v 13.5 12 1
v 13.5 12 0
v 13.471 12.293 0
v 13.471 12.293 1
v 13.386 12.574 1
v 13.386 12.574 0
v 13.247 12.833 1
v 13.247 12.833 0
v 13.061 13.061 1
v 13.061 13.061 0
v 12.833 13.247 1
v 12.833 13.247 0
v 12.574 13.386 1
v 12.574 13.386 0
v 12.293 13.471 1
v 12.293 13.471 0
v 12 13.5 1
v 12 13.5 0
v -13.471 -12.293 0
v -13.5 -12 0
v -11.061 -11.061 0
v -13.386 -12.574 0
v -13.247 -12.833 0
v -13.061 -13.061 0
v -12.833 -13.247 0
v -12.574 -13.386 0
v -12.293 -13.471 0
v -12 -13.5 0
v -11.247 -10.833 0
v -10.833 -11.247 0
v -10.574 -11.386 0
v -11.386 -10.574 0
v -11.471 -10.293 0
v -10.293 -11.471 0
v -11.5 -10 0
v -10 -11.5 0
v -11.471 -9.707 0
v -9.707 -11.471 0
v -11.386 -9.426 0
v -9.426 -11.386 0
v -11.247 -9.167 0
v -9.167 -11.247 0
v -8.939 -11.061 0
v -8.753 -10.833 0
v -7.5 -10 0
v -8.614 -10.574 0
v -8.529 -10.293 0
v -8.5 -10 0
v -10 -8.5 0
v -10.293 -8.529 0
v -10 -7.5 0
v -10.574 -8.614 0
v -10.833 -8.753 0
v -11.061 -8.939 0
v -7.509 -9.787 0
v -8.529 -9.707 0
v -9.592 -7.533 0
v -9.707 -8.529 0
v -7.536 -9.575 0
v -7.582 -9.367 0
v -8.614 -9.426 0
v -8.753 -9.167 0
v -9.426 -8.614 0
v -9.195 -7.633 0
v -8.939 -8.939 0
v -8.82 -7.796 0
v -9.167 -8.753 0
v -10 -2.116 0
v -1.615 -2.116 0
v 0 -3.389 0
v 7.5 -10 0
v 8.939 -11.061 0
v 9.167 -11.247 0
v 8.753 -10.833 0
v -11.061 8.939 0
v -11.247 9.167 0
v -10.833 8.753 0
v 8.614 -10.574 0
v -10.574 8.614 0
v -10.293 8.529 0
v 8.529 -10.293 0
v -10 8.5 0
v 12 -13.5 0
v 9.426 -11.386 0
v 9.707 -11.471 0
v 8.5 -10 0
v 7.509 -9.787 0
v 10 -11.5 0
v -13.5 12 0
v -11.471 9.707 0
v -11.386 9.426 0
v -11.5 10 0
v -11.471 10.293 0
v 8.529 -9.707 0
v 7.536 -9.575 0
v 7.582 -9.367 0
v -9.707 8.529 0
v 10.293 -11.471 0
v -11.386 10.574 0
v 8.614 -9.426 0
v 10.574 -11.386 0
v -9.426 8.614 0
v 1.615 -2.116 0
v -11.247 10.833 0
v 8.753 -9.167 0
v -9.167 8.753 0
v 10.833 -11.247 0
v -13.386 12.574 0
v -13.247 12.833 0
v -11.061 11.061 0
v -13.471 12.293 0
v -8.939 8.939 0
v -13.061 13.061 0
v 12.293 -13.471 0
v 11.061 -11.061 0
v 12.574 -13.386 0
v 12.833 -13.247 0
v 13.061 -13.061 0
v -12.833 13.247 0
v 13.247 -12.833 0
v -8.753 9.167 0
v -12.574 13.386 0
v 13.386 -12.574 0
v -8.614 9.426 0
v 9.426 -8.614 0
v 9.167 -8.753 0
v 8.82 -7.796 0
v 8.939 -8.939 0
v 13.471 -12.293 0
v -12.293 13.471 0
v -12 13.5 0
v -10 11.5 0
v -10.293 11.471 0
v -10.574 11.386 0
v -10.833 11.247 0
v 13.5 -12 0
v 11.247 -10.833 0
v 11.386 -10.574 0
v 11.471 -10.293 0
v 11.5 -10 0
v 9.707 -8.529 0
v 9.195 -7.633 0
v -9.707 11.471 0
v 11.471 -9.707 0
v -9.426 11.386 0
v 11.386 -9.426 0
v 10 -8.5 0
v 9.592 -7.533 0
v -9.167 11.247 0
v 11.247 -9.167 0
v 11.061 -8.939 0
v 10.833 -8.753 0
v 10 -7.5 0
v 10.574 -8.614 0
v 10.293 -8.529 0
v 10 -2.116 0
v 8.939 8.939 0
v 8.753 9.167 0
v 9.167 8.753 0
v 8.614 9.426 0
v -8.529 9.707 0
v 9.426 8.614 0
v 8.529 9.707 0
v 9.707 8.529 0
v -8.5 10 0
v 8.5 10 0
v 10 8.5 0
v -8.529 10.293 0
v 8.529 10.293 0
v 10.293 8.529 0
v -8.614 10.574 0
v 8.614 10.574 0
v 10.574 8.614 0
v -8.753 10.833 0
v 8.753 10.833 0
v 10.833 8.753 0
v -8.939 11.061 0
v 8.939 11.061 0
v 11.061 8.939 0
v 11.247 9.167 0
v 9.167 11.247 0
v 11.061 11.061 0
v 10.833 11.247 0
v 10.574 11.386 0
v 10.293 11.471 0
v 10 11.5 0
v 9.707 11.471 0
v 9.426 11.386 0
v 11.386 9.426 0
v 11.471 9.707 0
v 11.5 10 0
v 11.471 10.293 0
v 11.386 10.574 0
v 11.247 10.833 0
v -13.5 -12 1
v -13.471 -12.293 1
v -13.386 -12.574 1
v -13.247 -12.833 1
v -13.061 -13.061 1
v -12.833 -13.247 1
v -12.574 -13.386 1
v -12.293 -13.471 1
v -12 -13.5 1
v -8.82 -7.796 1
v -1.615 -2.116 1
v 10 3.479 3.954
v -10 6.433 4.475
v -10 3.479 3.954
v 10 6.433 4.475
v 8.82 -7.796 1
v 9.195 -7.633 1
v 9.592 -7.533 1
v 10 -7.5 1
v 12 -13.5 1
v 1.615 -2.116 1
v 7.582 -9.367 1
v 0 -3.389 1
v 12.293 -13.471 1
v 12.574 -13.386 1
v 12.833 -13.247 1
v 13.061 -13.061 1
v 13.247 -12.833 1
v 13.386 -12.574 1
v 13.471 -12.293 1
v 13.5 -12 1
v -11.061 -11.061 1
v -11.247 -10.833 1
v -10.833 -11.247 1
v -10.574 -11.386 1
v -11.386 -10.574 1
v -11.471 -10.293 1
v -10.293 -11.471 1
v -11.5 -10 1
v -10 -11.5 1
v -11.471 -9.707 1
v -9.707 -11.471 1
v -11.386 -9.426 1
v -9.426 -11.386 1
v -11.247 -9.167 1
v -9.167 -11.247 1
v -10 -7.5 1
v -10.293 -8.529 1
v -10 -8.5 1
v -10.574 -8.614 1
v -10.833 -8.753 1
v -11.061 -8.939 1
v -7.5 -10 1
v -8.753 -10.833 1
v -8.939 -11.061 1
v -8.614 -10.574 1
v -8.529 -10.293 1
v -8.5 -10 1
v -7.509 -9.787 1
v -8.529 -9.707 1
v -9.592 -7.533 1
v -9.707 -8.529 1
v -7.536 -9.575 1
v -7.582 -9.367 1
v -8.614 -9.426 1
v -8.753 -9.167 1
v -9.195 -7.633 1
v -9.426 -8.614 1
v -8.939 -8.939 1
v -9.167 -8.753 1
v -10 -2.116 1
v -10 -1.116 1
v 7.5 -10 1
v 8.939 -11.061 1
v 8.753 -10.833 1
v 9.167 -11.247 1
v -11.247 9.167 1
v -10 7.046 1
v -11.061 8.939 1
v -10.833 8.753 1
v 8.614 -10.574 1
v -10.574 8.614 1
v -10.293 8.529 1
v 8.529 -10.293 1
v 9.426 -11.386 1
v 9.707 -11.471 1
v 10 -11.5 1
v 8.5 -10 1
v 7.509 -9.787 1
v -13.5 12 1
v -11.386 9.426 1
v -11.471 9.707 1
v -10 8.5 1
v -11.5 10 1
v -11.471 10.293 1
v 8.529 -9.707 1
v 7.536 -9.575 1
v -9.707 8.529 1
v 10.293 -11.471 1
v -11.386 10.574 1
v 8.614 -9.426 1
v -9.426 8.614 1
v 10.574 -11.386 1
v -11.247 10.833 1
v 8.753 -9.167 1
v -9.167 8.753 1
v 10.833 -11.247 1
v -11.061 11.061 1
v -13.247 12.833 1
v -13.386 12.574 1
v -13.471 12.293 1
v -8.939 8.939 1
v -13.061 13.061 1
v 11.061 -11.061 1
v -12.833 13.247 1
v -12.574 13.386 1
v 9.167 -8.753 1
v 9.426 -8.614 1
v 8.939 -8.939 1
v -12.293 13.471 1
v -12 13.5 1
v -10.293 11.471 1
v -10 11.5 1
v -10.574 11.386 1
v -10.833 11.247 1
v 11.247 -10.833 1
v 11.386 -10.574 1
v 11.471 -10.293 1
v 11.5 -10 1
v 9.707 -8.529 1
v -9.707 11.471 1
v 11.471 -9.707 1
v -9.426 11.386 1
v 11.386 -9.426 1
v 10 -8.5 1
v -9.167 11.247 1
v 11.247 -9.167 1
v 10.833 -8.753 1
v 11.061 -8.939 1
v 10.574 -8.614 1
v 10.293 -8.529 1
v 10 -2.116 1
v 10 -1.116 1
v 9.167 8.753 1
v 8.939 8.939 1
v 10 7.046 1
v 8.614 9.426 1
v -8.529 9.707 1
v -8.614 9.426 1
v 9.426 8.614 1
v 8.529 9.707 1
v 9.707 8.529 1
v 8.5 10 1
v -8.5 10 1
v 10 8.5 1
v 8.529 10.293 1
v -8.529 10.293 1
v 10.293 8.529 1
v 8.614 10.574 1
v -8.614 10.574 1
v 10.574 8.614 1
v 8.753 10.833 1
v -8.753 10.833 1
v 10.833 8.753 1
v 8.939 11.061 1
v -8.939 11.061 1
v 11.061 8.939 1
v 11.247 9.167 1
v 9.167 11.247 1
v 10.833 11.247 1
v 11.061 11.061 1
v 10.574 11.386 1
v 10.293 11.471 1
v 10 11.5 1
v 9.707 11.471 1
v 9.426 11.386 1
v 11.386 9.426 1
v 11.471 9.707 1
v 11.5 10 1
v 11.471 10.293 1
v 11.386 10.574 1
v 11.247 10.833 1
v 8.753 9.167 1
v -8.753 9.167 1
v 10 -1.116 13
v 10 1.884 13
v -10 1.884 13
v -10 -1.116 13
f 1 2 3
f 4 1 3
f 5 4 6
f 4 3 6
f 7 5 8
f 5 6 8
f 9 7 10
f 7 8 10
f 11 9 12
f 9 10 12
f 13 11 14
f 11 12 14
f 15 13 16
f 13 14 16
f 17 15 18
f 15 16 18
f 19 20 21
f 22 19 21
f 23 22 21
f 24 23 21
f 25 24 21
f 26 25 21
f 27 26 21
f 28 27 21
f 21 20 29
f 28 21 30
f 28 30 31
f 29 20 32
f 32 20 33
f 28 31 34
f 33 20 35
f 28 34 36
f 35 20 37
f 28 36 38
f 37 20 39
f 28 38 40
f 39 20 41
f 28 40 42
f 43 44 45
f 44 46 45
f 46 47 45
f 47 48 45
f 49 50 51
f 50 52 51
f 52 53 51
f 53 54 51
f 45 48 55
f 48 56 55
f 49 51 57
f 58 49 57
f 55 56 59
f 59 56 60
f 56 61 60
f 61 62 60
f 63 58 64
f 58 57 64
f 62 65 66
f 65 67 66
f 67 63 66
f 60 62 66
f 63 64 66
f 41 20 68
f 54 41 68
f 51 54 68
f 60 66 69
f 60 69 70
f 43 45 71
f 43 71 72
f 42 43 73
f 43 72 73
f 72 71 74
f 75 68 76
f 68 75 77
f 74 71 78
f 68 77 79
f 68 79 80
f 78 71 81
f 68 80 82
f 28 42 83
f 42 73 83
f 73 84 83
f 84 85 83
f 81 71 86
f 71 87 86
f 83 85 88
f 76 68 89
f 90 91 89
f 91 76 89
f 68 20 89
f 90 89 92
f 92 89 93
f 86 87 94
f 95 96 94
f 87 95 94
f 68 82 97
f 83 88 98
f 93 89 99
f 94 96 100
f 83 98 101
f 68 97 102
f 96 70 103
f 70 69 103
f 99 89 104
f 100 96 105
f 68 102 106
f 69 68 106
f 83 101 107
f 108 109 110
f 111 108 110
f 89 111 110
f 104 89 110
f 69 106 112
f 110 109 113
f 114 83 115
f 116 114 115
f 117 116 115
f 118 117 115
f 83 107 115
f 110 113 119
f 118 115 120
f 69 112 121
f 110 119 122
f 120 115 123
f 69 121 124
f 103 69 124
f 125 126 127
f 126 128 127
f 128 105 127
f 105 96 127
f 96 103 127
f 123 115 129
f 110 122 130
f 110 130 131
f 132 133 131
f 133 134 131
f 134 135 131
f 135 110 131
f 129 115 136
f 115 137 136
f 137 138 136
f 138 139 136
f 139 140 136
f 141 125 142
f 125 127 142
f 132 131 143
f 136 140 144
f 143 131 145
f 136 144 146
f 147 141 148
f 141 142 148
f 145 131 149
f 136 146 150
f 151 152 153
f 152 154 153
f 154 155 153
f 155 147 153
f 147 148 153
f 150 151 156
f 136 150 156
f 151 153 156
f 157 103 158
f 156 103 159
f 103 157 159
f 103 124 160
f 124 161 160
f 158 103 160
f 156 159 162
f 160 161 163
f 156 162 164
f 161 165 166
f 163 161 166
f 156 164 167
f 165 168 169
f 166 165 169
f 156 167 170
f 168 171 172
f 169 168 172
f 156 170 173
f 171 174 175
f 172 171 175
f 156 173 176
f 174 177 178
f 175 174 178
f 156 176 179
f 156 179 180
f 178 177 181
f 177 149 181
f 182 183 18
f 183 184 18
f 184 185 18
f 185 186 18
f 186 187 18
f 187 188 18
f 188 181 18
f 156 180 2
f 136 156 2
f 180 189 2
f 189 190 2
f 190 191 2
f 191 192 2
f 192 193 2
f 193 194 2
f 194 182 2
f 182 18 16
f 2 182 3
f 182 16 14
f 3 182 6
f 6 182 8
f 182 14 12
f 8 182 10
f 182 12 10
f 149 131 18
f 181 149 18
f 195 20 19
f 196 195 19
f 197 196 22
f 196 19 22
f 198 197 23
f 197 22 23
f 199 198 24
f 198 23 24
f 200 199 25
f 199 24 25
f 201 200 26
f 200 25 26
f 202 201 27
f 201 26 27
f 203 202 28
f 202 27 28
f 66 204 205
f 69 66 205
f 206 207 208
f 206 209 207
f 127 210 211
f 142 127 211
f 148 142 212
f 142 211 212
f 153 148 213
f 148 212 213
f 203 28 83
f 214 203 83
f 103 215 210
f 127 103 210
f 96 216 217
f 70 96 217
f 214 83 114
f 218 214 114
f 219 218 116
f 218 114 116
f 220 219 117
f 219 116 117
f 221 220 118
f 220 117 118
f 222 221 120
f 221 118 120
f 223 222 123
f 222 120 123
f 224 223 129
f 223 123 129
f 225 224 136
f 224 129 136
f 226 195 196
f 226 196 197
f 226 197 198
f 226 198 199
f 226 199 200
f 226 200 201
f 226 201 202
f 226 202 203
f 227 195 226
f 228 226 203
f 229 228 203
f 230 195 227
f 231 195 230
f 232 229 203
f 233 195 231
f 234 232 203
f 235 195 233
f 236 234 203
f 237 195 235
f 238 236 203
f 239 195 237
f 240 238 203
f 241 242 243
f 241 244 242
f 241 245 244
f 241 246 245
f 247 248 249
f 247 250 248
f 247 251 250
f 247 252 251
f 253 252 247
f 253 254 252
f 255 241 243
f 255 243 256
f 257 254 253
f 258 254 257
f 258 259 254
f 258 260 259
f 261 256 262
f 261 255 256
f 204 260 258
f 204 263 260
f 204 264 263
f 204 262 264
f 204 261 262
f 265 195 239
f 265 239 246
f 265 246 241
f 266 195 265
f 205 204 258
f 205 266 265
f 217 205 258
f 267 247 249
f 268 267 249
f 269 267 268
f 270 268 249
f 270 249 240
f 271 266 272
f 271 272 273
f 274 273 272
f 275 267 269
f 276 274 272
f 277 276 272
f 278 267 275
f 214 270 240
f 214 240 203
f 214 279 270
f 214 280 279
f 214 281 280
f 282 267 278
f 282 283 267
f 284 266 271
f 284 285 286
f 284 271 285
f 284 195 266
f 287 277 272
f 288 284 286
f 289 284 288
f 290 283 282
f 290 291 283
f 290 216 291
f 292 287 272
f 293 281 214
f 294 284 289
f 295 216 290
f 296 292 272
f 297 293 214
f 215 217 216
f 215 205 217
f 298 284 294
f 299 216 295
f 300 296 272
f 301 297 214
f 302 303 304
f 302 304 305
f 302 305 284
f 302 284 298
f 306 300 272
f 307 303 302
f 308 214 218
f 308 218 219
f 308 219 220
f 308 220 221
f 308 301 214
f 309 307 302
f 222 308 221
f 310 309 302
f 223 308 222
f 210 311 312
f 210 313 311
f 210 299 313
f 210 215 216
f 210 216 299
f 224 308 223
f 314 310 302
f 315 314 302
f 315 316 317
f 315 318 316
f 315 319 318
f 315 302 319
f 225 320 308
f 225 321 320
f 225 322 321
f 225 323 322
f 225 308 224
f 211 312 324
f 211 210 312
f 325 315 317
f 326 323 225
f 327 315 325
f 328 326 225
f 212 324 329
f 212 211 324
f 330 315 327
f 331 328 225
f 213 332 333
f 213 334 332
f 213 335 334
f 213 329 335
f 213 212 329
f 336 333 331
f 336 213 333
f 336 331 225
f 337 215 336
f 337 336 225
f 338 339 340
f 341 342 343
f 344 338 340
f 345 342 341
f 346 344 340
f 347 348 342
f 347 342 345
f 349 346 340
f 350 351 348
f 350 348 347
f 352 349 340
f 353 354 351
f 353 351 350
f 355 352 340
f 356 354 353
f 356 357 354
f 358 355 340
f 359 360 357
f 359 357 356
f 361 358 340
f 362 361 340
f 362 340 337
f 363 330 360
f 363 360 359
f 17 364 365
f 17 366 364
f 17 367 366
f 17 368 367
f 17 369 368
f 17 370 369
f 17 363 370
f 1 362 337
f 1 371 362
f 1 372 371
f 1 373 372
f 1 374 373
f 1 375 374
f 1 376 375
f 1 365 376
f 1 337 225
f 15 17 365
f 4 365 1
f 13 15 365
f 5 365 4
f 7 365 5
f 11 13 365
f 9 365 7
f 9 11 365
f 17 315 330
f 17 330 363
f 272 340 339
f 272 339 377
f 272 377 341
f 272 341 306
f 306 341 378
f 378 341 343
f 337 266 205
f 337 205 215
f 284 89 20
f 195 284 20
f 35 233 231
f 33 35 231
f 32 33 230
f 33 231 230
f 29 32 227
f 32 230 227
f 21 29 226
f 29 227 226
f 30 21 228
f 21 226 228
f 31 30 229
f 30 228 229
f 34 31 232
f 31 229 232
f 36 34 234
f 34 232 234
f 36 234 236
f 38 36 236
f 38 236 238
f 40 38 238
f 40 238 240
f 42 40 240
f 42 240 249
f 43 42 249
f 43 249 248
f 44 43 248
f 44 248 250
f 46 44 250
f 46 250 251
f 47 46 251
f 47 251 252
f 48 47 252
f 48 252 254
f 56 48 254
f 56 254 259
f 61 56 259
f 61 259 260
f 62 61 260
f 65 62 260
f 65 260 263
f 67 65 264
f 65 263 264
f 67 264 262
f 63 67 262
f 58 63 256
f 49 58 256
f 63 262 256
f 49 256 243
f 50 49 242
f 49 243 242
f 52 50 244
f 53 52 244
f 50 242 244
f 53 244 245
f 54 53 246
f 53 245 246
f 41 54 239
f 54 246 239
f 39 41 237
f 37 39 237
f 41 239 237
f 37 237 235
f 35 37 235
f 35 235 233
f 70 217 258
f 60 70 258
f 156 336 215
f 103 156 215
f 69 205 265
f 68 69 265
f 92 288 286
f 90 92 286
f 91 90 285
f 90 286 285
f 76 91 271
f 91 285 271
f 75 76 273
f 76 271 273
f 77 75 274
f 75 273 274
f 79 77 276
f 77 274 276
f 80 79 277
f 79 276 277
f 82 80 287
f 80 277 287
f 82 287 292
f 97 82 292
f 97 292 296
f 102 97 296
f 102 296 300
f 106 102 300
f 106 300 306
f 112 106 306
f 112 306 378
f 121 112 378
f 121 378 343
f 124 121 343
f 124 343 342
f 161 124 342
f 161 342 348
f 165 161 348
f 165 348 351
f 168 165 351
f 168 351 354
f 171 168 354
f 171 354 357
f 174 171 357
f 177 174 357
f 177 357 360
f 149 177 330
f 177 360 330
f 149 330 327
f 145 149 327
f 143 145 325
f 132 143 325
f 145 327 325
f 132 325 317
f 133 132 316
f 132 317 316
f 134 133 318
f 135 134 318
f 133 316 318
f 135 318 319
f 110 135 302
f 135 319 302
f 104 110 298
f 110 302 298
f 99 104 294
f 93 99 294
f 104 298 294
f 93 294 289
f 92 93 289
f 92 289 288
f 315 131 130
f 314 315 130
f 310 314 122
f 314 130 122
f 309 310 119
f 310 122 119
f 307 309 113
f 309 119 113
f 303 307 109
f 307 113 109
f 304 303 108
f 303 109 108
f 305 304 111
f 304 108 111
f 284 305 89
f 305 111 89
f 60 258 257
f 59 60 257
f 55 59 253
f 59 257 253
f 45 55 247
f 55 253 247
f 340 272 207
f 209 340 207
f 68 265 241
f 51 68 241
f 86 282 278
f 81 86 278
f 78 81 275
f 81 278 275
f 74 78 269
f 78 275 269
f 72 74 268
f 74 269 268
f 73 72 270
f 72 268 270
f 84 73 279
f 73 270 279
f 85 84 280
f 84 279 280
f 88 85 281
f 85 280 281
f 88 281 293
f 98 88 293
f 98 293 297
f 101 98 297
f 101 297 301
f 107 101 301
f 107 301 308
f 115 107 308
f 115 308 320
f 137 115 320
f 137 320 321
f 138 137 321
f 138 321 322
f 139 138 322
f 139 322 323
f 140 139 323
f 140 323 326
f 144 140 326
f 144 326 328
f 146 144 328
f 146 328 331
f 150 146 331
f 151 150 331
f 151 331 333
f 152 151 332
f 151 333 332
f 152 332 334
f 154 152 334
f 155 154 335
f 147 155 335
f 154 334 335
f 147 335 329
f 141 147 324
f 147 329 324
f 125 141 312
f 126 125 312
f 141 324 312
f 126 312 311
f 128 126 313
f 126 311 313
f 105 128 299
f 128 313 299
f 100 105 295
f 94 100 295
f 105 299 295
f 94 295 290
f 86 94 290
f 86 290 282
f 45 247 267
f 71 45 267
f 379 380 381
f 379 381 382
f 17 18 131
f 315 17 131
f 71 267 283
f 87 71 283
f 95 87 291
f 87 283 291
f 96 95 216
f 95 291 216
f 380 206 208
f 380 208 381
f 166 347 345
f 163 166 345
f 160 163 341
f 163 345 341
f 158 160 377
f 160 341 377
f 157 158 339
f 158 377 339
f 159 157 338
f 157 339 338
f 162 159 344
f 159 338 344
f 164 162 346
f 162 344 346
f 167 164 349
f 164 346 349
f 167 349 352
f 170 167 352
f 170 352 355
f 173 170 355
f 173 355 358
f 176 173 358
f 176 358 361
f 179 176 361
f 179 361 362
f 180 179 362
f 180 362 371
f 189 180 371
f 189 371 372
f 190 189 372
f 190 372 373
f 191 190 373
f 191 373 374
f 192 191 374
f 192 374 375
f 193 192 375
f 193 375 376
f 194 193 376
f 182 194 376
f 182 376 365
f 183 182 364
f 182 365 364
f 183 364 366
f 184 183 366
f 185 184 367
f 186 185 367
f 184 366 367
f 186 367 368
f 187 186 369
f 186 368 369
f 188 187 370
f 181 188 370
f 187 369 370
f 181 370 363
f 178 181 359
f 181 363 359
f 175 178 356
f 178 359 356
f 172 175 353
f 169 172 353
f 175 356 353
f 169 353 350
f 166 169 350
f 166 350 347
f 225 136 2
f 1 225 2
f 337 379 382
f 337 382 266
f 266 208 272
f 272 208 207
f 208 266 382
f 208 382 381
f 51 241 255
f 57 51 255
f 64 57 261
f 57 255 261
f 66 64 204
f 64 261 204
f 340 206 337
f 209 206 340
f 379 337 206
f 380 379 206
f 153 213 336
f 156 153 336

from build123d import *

# Parameters (mm, degrees)
F1_DEPTH = 1
F3_DEPTH = 10
F4_D     = 3
F4_DEPTH = 5
F6_DEPTH = 25


with BuildPart() as f1:
    # F0 (on Top) → F1 (new body)
    with BuildSketch(Plane.XY):
        with BuildLine():
            Line((12, 13.5), (-12, 13.5))
            ThreePointArc((-12, 13.5), (-13.06066, 13.06066), (-13.5, 12))
            Line((-13.5, 12), (-13.5, -12))
            ThreePointArc((-13.5, -12), (-13.06066, -13.06066), (-12, -13.5))
            Line((-12, -13.5), (12, -13.5))
            ThreePointArc((12, -13.5), (13.06066, -13.06066), (13.5, -12))
            Line((13.5, -12), (13.5, 12))
            ThreePointArc((13.5, 12), (13.06066, 13.06066), (12, 13.5))
        make_face()
    extrude(amount=F1_DEPTH)

    # F2 (on Right) → F3 (join, symmetric)
    with BuildSketch(Plane.YZ):
        Polygon((6.433479, 4.475368), (3.479055, 3.954423), (1.884076, 13), (-1.115924, 13), (-1.115924, 1), (4, 1), (7.04628, 1), align=None)
    extrude(amount=F3_DEPTH, both=True)

    # F4
    with Locations(Plane(origin=(0, 0, 0), x_dir=(1, 0, 0), z_dir=(0, 0, -1))):
        with Locations((10, -10), (-10, -10), (-10, 10), (10, 10)):
            Hole(F4_D / 2, depth=F4_DEPTH)

    # F5 (on face) → F6 (cut)
    with BuildSketch(Plane.XY.offset(1)):
        with BuildLine():
            Line((-1.615174, -2.115924), (-10, -2.115924))
            Line((-10, -2.115924), (-10, -7.5))
            ThreePointArc((-10, -7.5), (-9.391612, -7.575157), (-8.819804, -7.796109))
            Line((-8.819804, -7.796109), (-1.615174, -2.115924))
        make_face()
        with BuildLine():
            ThreePointArc((-7.581547, -9.366688), (-7.52047, -9.68073), (-7.5, -10))
            Line((-7.5, -10), (7.5, -10))
            ThreePointArc((7.5, -10), (7.52047, -9.68073), (7.581547, -9.366688))
            Line((7.581547, -9.366688), (0, -3.389339))
            Line((0, -3.389339), (-7.581547, -9.366688))
        make_face()
        with BuildLine():
            ThreePointArc((8.819804, -7.796109), (9.391612, -7.575157), (10, -7.5))
            Line((10, -7.5), (10, -2.115924))
            Line((10, -2.115924), (1.615174, -2.115924))
            Line((1.615174, -2.115924), (8.819804, -7.796109))
        make_face()
    extrude(amount=-F6_DEPTH, mode=Mode.SUBTRACT)


solid = f1.part
